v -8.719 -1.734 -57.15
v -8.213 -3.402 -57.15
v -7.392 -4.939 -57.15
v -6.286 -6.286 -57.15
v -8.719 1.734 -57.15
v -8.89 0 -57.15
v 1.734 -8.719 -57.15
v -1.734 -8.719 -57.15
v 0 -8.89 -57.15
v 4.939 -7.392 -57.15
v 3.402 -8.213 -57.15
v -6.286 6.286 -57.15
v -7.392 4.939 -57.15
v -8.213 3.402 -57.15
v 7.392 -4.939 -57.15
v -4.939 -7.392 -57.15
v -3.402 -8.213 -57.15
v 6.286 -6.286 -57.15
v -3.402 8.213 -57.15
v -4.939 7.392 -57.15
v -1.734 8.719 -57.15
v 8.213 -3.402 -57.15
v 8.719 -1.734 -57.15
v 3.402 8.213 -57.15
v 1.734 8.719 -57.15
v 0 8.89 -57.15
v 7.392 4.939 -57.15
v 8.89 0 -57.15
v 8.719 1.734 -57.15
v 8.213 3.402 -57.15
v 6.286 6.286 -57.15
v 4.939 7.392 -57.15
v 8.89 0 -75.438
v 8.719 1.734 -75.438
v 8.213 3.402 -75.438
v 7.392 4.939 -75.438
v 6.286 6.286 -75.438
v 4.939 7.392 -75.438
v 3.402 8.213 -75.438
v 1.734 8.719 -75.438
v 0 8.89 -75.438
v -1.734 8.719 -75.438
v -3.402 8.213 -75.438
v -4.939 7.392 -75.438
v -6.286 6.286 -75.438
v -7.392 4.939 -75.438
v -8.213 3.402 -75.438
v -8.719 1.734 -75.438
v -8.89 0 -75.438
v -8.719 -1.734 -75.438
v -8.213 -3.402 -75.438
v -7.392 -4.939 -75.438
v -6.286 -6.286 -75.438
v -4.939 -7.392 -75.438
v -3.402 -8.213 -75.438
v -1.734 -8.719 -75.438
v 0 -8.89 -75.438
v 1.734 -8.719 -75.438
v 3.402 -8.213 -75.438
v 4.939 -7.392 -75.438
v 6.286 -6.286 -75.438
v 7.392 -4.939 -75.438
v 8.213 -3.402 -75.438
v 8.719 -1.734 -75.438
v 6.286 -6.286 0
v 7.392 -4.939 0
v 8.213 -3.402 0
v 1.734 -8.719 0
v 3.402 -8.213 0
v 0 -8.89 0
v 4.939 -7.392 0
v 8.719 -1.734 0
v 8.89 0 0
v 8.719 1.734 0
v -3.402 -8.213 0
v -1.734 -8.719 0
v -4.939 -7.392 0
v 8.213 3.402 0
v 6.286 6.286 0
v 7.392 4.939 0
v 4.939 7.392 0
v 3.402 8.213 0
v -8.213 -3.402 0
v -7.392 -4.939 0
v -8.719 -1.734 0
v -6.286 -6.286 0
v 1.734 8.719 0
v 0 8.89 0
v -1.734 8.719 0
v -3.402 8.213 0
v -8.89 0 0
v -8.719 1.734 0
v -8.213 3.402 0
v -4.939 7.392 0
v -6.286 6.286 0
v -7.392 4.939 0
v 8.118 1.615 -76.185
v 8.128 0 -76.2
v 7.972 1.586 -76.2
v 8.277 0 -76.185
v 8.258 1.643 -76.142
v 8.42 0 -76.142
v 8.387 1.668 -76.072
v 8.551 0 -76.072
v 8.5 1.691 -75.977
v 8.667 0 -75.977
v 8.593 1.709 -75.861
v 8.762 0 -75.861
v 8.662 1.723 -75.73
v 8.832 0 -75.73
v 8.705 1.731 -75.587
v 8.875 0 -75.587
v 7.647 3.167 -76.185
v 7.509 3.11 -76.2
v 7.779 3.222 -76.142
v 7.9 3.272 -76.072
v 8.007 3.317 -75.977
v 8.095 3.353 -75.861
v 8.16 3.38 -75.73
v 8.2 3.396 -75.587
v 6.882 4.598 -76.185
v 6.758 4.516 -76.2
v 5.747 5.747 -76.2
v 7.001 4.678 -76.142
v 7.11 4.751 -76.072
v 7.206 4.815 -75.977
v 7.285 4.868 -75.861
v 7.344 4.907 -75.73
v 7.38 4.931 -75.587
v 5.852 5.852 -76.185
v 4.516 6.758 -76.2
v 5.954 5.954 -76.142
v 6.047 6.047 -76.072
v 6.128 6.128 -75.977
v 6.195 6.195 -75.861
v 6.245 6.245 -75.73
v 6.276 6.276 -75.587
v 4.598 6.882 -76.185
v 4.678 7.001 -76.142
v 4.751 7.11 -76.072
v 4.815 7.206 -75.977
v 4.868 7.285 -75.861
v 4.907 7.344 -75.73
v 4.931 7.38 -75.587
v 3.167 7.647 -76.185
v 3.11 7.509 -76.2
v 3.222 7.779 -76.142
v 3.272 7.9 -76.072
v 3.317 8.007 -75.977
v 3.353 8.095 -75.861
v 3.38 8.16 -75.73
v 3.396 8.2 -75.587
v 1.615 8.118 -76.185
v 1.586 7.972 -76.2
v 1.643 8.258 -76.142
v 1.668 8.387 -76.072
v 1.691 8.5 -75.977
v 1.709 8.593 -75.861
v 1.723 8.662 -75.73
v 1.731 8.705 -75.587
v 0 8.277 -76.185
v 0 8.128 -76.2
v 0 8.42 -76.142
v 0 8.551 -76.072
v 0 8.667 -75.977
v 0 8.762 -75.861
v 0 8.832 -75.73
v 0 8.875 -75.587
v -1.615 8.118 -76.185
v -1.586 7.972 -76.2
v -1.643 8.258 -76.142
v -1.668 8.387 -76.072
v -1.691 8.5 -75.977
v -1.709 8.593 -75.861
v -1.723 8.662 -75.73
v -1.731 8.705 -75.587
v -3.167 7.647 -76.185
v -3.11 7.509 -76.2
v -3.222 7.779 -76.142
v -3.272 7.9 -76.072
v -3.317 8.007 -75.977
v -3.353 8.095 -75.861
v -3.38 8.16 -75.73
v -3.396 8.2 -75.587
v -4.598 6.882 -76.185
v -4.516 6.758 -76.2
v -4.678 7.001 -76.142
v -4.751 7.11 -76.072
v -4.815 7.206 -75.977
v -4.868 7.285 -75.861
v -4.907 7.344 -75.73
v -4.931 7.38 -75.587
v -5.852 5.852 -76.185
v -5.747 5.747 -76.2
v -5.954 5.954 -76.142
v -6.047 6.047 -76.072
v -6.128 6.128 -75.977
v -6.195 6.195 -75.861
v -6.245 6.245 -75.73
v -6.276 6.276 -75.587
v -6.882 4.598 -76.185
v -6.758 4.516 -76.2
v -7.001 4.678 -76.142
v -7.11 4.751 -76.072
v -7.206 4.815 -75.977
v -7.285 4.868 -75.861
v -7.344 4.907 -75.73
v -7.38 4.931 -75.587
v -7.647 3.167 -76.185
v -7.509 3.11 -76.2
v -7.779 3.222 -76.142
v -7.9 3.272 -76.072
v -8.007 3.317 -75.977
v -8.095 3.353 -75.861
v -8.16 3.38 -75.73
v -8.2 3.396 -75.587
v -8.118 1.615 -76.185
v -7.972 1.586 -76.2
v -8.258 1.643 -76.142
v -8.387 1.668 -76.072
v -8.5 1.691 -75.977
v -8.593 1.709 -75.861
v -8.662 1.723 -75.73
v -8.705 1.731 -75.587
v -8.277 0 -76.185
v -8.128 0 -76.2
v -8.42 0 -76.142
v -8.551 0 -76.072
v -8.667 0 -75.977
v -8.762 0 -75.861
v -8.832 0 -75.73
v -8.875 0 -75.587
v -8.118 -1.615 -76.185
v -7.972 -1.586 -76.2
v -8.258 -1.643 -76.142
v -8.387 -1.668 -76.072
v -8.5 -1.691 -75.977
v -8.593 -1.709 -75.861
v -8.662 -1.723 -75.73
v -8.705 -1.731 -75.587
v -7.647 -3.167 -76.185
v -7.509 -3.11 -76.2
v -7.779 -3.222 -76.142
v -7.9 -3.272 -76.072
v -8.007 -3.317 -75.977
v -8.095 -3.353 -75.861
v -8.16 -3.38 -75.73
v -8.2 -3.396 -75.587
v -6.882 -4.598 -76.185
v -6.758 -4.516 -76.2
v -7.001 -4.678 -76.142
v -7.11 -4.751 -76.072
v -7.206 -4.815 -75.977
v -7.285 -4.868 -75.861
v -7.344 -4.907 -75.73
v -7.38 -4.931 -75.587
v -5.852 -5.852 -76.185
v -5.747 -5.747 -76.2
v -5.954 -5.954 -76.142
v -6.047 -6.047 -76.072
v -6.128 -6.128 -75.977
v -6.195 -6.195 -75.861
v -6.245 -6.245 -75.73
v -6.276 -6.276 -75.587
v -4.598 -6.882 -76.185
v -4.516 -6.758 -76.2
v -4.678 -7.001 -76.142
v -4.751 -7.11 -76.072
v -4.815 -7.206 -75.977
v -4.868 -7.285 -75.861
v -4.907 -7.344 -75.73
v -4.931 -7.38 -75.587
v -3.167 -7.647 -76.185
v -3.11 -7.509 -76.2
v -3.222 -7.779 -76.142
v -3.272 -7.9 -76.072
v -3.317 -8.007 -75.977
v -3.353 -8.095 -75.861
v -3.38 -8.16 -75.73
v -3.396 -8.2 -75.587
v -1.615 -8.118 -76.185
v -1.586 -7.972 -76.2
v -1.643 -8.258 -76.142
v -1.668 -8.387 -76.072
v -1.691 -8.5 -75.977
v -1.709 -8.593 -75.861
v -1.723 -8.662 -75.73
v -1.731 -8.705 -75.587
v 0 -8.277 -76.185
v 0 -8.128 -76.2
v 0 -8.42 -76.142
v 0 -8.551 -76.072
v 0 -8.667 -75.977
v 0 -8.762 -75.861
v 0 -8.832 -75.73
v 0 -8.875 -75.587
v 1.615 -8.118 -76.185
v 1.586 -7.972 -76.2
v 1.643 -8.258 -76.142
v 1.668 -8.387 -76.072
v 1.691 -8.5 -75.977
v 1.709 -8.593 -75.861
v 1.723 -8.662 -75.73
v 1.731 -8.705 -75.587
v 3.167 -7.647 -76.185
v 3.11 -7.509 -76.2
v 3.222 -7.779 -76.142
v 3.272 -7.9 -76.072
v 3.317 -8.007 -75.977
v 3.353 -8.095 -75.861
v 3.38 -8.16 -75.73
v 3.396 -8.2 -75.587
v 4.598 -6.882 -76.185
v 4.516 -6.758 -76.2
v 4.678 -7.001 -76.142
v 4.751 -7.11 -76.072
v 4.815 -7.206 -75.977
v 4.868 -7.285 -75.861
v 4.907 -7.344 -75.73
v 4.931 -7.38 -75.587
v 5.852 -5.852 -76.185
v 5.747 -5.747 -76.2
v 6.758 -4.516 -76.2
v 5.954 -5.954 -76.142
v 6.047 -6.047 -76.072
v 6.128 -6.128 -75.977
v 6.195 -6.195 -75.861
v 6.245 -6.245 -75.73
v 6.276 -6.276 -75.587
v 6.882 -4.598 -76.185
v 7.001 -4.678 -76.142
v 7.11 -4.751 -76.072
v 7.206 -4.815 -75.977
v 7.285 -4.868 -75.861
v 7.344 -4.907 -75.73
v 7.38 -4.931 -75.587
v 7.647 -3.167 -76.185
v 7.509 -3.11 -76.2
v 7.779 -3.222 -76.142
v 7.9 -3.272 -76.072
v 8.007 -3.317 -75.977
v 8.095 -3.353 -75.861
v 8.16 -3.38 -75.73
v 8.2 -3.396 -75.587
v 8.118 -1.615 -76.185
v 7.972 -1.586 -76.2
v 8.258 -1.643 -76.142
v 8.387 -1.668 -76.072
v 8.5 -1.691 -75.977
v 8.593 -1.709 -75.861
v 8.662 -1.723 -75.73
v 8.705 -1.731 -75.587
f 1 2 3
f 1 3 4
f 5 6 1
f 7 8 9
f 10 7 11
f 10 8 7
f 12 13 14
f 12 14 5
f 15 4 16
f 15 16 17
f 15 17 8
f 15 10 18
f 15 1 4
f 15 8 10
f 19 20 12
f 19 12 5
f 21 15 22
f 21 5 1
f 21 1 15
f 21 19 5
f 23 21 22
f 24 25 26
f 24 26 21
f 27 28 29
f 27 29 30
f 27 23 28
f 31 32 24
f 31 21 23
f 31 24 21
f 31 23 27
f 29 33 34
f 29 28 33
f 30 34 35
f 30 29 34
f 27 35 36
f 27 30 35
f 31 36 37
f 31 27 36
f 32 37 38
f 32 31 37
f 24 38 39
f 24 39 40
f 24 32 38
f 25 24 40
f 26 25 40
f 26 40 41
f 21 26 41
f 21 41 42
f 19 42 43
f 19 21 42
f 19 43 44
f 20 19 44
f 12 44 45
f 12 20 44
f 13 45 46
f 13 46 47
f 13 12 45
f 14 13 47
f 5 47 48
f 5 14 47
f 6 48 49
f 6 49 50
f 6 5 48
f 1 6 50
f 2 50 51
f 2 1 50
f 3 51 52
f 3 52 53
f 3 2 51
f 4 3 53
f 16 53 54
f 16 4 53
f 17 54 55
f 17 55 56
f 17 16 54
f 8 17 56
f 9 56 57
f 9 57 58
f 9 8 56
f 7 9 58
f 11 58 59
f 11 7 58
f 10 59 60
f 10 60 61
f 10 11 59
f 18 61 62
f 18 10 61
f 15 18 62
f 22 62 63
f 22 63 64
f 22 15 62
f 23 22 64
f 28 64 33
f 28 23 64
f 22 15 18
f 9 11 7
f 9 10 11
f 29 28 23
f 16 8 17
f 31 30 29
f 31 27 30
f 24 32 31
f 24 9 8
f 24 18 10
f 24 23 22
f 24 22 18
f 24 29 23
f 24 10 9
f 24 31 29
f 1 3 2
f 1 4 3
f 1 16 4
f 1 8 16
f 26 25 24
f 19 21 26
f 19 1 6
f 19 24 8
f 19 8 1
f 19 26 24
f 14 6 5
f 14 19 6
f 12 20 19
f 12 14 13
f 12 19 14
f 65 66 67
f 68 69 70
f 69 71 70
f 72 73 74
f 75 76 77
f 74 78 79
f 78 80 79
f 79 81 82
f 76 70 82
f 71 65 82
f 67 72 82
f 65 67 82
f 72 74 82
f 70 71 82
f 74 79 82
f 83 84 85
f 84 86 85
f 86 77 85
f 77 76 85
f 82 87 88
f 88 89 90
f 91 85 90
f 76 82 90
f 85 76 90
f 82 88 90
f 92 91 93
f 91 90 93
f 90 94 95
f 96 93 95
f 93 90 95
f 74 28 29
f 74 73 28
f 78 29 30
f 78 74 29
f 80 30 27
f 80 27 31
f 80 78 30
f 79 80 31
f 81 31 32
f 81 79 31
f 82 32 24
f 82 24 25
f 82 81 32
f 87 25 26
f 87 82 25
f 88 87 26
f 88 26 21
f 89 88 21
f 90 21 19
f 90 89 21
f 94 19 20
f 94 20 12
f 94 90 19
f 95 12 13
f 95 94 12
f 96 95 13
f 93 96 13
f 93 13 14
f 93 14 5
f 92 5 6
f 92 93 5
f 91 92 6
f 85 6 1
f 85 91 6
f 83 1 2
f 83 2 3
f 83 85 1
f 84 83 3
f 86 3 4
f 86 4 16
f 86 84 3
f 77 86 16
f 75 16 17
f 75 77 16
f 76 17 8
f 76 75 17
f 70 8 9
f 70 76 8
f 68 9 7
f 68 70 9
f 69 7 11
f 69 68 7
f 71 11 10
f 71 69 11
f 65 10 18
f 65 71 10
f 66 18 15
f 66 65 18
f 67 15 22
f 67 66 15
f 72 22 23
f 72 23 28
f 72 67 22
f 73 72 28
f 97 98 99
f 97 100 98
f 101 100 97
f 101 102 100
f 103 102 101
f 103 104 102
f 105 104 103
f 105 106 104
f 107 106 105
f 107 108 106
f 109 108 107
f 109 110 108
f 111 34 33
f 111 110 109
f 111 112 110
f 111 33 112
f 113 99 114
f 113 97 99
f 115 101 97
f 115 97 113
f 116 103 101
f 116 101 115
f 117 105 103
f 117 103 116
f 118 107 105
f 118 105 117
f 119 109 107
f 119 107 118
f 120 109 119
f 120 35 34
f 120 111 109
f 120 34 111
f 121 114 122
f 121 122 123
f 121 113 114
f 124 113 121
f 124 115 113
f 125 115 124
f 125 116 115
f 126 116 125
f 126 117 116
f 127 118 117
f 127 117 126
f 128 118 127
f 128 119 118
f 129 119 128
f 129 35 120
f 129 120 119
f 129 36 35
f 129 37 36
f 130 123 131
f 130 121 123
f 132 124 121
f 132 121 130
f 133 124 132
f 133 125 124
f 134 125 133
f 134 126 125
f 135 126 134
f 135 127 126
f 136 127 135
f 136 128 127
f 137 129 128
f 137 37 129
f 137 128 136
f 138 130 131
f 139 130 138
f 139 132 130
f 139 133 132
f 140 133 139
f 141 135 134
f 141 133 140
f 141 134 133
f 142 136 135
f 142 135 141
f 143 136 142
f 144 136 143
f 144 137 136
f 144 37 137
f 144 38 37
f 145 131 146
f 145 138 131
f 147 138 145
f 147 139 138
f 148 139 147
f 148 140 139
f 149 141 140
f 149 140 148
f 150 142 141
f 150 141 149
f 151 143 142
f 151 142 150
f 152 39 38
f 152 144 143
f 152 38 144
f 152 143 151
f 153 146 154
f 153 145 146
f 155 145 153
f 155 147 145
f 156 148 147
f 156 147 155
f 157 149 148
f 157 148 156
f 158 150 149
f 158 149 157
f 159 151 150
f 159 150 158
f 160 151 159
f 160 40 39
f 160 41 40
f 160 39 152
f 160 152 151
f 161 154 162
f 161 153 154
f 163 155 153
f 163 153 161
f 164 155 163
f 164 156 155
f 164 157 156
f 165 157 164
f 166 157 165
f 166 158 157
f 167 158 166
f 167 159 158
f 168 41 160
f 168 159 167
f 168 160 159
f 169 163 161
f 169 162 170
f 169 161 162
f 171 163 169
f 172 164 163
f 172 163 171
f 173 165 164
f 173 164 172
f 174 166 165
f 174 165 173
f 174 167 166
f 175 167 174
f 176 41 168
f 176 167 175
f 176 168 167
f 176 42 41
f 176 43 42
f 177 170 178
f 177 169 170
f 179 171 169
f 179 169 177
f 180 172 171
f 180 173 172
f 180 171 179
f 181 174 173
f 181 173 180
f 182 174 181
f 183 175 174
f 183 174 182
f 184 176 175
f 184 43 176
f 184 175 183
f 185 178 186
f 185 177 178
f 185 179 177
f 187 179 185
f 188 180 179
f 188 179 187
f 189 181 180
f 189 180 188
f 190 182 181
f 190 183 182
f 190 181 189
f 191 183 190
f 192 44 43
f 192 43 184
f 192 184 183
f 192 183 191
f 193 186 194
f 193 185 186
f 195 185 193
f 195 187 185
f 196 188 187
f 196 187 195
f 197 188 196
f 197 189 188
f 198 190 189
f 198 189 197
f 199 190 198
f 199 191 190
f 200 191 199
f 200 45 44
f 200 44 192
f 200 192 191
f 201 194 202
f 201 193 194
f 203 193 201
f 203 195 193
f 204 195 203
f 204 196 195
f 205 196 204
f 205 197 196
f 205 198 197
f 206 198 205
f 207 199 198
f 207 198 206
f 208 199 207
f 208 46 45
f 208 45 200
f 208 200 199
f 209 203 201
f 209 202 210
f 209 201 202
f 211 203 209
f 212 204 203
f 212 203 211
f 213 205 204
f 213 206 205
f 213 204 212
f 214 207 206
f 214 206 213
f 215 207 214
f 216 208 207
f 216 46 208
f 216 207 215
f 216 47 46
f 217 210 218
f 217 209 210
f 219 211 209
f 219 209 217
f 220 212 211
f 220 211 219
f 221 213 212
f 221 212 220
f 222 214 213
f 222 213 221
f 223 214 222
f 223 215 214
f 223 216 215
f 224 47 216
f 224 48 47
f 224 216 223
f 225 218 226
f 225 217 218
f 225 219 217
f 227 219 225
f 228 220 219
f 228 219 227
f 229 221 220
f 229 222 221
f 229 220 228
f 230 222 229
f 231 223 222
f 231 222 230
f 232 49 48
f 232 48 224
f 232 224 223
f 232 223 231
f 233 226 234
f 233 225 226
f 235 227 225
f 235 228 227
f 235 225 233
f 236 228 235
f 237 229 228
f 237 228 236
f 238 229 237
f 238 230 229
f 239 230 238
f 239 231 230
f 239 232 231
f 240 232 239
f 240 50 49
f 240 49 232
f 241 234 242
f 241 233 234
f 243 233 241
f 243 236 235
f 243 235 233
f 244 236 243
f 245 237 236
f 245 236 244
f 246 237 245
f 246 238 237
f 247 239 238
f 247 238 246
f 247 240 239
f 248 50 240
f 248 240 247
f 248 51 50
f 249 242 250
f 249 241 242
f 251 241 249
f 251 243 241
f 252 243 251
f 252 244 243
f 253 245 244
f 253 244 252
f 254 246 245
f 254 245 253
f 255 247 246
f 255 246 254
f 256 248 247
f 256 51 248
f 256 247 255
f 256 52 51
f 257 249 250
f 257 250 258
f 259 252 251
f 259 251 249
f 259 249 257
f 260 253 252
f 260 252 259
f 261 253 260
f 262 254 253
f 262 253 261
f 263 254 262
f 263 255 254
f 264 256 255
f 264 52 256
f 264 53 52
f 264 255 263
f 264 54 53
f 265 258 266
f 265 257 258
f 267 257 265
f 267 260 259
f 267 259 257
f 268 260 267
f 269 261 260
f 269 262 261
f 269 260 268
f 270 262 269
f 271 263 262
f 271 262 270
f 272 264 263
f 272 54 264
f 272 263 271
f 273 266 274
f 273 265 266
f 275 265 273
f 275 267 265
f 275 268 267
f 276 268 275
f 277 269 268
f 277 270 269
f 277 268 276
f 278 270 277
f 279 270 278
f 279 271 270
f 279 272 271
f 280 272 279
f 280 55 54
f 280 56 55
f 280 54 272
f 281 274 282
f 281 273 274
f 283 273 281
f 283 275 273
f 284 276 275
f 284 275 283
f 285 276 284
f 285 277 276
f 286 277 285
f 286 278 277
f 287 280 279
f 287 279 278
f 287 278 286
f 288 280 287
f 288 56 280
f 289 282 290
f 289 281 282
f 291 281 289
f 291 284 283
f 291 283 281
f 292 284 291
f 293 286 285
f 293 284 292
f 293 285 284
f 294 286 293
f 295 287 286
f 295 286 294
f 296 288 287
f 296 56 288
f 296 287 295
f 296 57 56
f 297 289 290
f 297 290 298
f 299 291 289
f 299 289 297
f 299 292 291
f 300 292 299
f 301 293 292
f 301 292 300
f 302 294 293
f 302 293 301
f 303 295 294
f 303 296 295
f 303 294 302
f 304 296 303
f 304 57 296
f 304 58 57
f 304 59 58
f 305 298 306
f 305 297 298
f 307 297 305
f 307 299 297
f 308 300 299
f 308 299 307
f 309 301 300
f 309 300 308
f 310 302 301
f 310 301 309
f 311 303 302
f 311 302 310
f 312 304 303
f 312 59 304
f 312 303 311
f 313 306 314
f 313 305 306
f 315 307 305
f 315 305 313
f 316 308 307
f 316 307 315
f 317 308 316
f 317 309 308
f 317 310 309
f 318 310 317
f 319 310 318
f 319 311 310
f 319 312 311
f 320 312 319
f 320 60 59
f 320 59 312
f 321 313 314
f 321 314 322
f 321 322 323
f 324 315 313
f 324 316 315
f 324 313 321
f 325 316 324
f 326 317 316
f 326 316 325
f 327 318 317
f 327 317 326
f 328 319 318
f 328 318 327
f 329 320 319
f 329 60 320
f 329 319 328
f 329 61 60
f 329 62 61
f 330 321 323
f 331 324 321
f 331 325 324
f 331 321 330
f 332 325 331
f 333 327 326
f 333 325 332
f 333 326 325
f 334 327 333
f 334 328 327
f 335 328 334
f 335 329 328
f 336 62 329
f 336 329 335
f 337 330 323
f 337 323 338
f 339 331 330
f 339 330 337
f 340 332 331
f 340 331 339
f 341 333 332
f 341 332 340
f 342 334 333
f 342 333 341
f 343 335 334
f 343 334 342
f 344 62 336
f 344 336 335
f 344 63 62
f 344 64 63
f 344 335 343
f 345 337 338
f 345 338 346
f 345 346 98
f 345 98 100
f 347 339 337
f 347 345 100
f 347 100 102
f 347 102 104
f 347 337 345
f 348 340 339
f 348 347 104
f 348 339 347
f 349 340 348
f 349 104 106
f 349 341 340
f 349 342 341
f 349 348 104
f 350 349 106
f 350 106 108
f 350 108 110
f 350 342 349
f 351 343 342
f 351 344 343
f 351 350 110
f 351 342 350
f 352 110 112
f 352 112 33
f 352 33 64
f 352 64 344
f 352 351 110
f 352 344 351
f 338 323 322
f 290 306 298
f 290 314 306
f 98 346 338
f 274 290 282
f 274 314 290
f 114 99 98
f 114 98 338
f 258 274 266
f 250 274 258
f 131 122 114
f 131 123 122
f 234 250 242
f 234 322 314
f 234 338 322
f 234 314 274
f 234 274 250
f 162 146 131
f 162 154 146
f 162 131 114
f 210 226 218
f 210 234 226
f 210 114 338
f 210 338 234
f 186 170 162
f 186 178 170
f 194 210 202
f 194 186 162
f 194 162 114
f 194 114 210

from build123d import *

# Parameters (mm, degrees)
F0_W = 8.89
F0_H = 57.15


with BuildPart() as f1:
    # F0 (on Front) → F1 (revolve)
    with BuildSketch(Plane.XZ):
        with BuildLine():
            Line((8.89, -57.15), (0, -57.15))
            Line((0, -57.15), (0, -76.2))
            Line((0, -76.2), (8.128, -76.2))
            ThreePointArc((8.128, -76.2), (8.666815, -75.976815), (8.89, -75.438))
            Line((8.89, -75.438), (8.89, -57.15))
        make_face()
    revolve(axis=Axis((0, 0, -66.675), (0, 0, 1)))


with BuildPart() as f2:
    # F0 (on Front) → F2 (revolve)
    with BuildSketch(Plane.XZ):
        with Locations((4.445, -28.575)):
            Rectangle(F0_W, F0_H)
    revolve(axis=Axis((0, 0, -28.575), (0, 0, 1)))


solid = Compound([f1.part, f2.part])
